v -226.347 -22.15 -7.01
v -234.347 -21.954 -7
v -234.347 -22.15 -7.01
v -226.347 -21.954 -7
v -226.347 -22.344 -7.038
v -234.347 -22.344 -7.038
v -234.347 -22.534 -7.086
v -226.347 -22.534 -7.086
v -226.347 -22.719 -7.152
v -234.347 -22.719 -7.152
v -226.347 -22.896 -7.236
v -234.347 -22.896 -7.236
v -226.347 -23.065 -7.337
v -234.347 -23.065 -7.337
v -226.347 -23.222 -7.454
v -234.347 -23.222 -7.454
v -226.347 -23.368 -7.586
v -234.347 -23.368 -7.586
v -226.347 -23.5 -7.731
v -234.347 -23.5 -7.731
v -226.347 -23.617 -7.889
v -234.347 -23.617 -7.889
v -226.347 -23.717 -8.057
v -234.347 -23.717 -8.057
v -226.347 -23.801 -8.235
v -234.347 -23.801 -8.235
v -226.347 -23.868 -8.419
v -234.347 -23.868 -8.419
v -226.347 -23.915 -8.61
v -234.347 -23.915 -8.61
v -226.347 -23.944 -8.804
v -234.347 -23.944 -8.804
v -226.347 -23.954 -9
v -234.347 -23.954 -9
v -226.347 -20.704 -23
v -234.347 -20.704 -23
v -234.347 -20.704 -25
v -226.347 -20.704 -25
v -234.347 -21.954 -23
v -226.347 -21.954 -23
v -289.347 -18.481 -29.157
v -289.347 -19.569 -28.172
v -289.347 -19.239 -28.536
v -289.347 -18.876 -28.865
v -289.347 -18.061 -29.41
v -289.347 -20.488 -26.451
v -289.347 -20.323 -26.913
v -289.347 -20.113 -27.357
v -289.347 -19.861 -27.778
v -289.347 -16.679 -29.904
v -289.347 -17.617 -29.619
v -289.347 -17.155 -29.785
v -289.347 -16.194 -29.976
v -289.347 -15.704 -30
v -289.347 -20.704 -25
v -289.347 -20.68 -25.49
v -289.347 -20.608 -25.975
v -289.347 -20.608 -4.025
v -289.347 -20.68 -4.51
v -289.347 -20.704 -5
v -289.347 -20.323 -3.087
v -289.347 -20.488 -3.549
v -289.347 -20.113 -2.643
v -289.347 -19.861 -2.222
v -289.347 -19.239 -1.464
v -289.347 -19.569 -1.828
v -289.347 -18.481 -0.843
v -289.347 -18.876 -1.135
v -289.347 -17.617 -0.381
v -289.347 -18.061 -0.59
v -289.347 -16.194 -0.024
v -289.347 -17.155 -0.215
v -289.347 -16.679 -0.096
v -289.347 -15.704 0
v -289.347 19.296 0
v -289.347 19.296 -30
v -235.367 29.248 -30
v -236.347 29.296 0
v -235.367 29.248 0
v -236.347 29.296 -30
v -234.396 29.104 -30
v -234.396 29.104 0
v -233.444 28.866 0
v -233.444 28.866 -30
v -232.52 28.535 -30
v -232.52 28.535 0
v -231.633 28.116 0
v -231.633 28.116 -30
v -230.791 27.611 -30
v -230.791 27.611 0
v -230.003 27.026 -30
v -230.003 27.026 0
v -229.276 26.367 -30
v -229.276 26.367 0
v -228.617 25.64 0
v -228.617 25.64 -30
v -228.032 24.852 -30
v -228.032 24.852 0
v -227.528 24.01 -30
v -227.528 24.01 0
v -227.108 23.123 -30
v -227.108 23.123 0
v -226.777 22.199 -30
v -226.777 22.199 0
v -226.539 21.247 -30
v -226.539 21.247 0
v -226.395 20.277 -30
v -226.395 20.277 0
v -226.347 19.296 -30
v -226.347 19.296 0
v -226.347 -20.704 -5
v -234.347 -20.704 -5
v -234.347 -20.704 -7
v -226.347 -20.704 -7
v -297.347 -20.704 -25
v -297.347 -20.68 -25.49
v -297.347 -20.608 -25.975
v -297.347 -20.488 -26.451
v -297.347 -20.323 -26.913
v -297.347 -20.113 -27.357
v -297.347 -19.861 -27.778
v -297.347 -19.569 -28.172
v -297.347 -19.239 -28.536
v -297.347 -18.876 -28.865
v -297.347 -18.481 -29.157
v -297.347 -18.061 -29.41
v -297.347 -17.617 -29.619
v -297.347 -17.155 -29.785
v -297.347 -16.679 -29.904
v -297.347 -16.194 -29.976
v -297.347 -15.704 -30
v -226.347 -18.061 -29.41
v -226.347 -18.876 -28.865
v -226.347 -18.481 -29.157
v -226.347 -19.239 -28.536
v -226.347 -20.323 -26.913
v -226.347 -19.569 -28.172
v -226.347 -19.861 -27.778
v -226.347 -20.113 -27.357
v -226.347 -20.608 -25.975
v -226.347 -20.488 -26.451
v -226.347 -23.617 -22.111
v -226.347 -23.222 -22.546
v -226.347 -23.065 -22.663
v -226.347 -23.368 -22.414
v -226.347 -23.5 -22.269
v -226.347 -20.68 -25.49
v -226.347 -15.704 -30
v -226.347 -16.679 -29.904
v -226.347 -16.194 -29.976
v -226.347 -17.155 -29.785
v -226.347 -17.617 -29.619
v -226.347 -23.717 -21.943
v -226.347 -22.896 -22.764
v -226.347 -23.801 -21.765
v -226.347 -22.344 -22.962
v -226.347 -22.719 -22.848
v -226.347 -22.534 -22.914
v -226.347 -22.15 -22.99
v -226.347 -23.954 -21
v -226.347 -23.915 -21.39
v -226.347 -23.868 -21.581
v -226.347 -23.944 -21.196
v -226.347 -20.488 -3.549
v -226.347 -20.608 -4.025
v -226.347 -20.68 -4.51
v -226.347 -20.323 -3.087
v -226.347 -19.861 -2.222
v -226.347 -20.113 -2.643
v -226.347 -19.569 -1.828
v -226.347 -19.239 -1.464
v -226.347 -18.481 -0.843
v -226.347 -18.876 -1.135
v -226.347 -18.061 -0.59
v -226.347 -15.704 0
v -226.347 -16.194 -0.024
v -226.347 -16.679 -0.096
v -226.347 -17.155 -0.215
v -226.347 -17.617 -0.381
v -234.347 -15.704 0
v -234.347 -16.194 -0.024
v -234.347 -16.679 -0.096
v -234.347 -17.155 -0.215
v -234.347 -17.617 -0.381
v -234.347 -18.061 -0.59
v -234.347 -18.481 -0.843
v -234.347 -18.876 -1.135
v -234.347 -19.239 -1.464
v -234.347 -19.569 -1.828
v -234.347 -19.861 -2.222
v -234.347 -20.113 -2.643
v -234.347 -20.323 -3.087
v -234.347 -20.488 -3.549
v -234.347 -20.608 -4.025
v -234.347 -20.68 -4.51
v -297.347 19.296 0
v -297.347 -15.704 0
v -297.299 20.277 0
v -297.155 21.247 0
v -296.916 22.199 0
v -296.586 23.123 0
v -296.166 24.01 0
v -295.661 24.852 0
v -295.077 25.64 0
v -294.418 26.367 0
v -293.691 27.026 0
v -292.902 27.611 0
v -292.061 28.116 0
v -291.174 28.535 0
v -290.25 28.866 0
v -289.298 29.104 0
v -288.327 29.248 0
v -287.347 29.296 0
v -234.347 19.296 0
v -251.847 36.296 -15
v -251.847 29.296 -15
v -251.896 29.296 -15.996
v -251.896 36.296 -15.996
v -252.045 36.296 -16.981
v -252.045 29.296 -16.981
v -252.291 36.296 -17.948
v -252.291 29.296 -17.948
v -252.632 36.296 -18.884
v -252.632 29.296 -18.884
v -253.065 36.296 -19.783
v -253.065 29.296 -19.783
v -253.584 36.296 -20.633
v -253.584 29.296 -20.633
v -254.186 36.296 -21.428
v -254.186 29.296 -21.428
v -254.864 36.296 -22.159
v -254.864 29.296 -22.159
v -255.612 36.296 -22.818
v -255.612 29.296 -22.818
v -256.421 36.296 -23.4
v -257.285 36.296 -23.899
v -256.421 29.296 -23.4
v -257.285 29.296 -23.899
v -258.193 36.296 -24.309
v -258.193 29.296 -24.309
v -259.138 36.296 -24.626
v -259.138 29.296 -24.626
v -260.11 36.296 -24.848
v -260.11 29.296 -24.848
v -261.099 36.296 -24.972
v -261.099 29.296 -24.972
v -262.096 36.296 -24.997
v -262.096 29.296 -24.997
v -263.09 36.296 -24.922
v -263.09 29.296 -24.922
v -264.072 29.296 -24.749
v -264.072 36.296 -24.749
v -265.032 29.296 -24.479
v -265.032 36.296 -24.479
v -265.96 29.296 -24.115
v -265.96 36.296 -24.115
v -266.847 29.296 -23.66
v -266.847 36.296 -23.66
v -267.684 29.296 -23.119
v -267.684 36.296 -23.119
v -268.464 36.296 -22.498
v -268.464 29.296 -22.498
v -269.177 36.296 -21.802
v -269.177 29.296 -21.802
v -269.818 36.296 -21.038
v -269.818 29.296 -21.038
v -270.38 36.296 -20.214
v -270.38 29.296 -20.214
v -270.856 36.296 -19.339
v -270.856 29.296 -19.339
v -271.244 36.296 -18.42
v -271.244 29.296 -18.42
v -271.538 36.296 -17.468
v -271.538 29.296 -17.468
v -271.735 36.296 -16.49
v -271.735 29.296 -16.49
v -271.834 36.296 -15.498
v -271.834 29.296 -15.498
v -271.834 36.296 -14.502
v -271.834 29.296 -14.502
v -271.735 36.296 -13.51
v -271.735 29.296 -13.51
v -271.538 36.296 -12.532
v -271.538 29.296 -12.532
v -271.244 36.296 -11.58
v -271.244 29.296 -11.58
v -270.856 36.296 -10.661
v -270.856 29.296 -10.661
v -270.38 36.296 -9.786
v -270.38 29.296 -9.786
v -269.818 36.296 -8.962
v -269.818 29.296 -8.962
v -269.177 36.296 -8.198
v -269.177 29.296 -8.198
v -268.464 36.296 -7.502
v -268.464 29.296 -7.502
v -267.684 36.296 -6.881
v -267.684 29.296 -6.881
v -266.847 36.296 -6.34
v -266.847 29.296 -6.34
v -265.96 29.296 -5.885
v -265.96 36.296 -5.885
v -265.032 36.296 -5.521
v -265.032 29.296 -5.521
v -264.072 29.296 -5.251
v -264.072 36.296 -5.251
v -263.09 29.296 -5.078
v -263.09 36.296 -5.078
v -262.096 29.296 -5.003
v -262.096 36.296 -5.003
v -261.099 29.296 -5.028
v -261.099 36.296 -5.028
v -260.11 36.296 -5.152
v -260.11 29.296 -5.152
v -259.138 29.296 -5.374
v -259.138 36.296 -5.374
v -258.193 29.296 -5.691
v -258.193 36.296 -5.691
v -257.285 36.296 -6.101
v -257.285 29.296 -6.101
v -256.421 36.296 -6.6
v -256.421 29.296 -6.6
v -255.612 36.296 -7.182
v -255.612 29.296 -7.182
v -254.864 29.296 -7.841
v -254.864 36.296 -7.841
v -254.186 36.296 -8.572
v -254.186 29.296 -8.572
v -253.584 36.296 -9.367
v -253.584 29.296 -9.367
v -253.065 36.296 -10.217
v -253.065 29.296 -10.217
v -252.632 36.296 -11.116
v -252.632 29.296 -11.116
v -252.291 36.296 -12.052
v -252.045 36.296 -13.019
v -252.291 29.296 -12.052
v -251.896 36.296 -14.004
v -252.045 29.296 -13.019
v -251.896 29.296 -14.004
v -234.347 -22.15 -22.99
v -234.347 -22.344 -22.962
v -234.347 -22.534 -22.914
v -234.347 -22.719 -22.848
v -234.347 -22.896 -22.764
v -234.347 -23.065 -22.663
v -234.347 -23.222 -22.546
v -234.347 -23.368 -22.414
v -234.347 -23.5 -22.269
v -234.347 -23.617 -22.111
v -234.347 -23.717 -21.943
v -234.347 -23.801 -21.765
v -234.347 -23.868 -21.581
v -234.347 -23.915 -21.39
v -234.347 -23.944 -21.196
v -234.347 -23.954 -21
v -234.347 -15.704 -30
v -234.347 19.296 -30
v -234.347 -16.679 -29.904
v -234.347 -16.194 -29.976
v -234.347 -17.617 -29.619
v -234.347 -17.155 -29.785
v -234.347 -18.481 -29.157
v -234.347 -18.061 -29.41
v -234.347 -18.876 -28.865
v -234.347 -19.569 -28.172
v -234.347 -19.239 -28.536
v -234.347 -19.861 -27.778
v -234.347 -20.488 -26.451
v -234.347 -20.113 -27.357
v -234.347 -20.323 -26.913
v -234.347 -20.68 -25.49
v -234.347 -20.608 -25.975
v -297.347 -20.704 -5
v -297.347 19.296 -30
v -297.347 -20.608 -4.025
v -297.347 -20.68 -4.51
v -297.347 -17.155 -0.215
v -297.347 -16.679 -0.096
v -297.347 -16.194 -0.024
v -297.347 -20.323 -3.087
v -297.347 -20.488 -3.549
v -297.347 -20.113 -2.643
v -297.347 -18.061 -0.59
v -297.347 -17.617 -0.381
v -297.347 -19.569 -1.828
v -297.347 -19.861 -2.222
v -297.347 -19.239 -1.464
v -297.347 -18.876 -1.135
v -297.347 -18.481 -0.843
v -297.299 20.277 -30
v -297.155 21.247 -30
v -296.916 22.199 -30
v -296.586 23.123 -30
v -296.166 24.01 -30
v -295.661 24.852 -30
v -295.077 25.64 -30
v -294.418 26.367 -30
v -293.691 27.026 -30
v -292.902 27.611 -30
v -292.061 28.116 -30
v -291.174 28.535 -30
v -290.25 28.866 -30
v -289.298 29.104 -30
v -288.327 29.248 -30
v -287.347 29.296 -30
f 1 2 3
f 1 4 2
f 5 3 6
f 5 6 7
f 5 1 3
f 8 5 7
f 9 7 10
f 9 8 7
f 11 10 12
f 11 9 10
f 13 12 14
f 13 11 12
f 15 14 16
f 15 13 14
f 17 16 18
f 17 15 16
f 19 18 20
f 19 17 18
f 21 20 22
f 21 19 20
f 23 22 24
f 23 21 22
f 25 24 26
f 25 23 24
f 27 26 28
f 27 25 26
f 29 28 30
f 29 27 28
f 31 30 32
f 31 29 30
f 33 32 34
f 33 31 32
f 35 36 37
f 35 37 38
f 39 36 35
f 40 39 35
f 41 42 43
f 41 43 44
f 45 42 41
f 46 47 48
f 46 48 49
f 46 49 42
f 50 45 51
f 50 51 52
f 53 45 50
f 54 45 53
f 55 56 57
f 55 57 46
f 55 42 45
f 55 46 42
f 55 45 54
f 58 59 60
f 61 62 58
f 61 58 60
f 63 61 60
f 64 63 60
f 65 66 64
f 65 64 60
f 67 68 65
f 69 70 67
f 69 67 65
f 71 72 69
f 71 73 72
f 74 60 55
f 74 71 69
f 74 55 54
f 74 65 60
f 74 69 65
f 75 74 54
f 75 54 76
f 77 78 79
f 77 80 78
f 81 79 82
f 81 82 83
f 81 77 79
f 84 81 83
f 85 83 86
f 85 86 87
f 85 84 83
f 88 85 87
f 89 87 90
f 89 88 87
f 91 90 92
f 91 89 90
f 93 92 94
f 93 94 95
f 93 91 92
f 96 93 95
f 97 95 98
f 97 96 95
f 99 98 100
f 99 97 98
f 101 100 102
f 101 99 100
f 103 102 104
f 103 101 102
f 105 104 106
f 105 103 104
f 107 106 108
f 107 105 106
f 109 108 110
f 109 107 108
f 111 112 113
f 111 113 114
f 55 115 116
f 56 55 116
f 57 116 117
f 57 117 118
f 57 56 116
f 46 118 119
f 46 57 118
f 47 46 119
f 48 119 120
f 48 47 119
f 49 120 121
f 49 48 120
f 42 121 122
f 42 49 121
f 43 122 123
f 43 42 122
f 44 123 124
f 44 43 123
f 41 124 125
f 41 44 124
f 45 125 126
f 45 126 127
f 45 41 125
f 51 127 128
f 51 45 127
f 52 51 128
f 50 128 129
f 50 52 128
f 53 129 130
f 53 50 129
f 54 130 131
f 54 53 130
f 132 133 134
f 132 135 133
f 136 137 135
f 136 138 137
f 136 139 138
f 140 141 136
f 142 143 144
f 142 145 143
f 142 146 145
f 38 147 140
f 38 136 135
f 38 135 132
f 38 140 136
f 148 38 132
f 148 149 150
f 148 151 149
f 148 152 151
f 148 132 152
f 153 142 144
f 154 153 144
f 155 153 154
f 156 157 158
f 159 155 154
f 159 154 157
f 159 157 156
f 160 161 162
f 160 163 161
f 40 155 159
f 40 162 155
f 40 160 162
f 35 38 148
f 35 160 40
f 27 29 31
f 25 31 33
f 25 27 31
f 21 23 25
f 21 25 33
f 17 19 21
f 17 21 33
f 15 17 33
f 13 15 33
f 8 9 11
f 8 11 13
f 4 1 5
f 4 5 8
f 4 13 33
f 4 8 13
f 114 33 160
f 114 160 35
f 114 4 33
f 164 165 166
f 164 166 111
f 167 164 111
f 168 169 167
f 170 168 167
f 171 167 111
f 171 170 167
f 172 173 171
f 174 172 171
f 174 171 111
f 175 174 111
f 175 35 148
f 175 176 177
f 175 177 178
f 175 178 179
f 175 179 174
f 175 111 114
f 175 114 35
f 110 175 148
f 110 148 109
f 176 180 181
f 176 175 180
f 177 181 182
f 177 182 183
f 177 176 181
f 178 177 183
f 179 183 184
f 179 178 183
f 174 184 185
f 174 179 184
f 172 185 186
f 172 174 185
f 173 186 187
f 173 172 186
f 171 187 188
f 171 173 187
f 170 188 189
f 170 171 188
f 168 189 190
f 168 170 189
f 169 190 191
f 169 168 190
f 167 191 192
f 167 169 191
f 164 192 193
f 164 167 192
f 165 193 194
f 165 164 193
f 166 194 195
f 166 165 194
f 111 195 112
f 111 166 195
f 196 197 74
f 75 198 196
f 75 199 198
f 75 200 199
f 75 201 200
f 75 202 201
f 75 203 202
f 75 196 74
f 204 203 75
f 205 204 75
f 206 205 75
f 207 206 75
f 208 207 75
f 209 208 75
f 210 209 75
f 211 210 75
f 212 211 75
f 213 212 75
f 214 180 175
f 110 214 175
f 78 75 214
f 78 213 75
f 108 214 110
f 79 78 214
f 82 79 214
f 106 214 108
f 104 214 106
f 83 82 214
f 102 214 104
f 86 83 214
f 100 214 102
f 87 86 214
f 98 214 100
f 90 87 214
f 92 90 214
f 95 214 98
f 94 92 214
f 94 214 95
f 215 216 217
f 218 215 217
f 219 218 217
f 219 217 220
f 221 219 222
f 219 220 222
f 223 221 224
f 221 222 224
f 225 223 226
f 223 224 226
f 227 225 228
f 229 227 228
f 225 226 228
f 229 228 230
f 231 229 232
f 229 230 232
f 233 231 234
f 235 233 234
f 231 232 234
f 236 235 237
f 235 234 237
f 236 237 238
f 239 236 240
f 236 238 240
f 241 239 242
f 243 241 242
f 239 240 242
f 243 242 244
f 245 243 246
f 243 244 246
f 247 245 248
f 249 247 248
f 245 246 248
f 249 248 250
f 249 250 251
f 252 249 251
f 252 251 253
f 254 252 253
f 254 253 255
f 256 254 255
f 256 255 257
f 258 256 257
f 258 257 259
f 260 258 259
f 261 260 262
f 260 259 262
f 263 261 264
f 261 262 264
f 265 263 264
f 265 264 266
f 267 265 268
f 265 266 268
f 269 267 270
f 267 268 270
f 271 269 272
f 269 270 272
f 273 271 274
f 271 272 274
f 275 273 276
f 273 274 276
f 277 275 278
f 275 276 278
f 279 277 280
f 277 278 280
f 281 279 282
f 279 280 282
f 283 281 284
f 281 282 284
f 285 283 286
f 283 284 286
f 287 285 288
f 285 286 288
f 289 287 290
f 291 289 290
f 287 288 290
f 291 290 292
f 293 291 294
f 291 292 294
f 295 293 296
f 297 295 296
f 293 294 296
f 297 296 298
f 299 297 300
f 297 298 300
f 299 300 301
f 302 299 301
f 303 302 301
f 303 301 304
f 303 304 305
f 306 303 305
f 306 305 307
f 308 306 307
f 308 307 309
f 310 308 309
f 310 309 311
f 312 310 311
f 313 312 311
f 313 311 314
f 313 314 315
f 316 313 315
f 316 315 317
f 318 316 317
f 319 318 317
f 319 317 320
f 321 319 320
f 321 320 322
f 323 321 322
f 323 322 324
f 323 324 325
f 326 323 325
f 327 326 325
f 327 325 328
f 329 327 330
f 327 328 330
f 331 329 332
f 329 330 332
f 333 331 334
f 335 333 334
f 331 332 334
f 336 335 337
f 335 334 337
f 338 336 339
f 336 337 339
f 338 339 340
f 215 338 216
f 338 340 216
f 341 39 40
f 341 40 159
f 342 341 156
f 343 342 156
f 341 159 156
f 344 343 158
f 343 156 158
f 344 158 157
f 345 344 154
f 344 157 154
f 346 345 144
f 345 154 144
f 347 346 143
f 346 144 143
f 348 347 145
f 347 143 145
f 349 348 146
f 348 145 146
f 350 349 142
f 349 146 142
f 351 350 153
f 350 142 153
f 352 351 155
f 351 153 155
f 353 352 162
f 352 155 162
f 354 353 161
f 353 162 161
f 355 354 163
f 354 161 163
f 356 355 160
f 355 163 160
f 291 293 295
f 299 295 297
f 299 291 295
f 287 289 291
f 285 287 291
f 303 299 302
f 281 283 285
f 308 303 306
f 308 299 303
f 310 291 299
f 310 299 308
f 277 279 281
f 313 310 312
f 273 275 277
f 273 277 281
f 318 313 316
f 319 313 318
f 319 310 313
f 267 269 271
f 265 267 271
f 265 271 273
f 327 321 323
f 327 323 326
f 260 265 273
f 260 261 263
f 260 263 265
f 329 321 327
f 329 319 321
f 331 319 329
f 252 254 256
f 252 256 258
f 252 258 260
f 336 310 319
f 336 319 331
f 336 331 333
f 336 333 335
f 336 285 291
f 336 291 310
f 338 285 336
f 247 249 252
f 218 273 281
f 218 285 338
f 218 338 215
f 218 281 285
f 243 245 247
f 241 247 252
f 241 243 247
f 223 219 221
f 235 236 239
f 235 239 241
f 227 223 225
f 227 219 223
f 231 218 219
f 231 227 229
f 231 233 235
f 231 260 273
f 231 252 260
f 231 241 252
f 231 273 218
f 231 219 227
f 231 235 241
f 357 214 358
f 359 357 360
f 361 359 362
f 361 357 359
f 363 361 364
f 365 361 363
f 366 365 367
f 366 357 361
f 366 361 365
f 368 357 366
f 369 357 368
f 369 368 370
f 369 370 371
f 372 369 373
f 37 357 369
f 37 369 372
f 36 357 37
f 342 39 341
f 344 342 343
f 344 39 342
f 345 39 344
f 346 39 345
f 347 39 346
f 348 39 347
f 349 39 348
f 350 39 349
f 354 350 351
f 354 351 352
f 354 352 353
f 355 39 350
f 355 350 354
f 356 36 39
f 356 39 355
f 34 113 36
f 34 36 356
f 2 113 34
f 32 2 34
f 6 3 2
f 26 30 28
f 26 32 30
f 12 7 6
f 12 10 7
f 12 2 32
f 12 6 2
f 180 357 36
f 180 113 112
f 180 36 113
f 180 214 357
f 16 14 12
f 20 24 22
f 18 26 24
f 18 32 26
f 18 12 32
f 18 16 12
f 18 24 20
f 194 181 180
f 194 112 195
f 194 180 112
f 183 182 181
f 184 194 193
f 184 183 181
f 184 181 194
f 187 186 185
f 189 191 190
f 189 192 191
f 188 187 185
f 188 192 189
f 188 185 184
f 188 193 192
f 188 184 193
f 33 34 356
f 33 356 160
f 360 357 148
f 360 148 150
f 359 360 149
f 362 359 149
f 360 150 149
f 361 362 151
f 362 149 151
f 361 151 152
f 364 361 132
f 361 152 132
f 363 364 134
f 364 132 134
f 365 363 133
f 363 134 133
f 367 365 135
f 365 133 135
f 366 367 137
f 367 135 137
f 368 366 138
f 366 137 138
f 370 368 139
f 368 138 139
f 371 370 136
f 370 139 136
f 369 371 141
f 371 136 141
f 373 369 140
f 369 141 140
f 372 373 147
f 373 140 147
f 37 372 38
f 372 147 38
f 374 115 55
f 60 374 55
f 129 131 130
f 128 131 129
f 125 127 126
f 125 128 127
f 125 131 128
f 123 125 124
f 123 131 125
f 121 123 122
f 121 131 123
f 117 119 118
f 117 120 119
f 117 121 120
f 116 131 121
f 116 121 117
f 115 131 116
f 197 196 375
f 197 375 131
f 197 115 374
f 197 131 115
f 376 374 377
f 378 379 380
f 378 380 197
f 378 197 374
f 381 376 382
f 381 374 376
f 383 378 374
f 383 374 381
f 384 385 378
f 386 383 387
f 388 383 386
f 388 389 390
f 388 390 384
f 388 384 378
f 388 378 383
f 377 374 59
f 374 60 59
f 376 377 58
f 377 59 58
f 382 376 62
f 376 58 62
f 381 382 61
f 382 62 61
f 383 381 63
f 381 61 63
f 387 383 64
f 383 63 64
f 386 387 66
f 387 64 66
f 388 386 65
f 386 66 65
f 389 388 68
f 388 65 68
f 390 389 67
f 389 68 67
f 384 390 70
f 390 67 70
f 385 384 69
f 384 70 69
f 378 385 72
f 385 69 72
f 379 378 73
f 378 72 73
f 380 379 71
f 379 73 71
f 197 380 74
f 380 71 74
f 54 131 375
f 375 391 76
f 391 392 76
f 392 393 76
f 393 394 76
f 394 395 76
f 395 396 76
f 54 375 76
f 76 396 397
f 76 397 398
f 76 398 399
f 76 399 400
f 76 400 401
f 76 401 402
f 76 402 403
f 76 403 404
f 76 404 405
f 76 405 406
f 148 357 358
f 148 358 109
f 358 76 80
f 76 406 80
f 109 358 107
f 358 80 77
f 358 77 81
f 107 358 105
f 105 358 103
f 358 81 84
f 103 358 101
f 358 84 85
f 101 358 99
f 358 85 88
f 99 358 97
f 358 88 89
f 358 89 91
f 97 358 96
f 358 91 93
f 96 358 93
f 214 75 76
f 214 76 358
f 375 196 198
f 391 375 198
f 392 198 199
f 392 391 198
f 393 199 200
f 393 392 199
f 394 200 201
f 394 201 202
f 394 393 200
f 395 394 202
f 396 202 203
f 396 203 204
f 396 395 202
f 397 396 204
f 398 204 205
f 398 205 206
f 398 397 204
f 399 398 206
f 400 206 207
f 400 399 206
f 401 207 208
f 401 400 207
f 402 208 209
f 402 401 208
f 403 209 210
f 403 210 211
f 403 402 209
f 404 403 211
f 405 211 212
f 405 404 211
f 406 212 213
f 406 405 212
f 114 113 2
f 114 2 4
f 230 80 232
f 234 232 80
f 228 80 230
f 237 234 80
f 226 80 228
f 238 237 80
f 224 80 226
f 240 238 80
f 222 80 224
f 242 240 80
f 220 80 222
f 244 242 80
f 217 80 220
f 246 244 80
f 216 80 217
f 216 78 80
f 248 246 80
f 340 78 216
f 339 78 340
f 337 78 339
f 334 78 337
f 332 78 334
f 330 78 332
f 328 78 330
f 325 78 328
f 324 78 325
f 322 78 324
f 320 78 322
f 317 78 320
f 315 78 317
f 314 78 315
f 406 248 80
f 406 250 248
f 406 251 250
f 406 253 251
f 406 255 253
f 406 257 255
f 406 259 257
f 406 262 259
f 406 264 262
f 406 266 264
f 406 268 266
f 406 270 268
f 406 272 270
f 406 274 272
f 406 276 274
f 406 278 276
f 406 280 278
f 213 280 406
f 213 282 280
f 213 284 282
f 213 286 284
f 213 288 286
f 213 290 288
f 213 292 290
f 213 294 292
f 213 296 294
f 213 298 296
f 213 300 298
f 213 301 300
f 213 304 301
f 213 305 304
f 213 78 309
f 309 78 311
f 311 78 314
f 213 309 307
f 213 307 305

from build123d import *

# Parameters (mm, degrees)
BOSS_EXTRUDE1_DEPTH = 30
SKETCH2_R           = 10
BOSS_EXTRUDE2_DEPTH = 7
FILLET1_R           = 5
FILLET2_R           = 10
SKETCH3_W           = 8
SKETCH3_H           = 16
BOSS_EXTRUDE3_DEPTH = 3.25
FILLET3_R           = 2


with BuildPart() as part:
    # Sketch1 → Boss-Extrude1 (new body)
    with BuildSketch(Plane.XY):
        Polygon((-289.346773142, -20.703646913), (-289.346773142, 19.296353087), (-234.346773142, 19.296353087), (-234.346773142, -20.703646913), (-226.346773142, -20.703646913), (-226.346773142, 29.296353087), (-297.346773142, 29.296353087), (-297.346773142, -20.703646913), align=None)
    extrude(amount=-BOSS_EXTRUDE1_DEPTH)

    # Sketch2 → Boss-Extrude2 (add)
    with BuildSketch(Plane(origin=(0, 29.296353087, 0), x_dir=(1, 0, 0), z_dir=(0, 1, 0))):
        with Locations((-261.846773142, 15)):
            Circle(SKETCH2_R)
    extrude(amount=BOSS_EXTRUDE2_DEPTH)

    # Fillet1
    fillet1_edges = [part.edges().sort_by_distance(p)[0] for p in [
        (-293.346773142, -20.703646913, 0),
        (-293.346773142, -20.703646913, -30),
        (-230.346773142, -20.703646913, 0),
        (-230.346773142, -20.703646913, -30),
    ]]
    fillet(fillet1_edges, radius=FILLET1_R)

    # Fillet2
    fillet2_edges = [part.edges().sort_by_distance(p)[0] for p in [
        (-297.346773142, 29.296353087, -15),
        (-226.346773142, 29.296353087, -15),
    ]]
    fillet(fillet2_edges, radius=FILLET2_R)

    # Sketch3 → Boss-Extrude3 (add)
    with BuildSketch(Plane.XZ.offset(20.703646913)):
        with Locations((-230.346773142, -15)):
            Rectangle(SKETCH3_W, SKETCH3_H)
    extrude(amount=BOSS_EXTRUDE3_DEPTH)

    # Fillet3
    fillet3_edges = [part.edges().sort_by_distance(p)[0] for p in [
        (-230.346773142, -23.953646913, -7),
        (-230.346773142, -23.953646913, -23),
    ]]
    fillet(fillet3_edges, radius=FILLET3_R)


solid = part.part
